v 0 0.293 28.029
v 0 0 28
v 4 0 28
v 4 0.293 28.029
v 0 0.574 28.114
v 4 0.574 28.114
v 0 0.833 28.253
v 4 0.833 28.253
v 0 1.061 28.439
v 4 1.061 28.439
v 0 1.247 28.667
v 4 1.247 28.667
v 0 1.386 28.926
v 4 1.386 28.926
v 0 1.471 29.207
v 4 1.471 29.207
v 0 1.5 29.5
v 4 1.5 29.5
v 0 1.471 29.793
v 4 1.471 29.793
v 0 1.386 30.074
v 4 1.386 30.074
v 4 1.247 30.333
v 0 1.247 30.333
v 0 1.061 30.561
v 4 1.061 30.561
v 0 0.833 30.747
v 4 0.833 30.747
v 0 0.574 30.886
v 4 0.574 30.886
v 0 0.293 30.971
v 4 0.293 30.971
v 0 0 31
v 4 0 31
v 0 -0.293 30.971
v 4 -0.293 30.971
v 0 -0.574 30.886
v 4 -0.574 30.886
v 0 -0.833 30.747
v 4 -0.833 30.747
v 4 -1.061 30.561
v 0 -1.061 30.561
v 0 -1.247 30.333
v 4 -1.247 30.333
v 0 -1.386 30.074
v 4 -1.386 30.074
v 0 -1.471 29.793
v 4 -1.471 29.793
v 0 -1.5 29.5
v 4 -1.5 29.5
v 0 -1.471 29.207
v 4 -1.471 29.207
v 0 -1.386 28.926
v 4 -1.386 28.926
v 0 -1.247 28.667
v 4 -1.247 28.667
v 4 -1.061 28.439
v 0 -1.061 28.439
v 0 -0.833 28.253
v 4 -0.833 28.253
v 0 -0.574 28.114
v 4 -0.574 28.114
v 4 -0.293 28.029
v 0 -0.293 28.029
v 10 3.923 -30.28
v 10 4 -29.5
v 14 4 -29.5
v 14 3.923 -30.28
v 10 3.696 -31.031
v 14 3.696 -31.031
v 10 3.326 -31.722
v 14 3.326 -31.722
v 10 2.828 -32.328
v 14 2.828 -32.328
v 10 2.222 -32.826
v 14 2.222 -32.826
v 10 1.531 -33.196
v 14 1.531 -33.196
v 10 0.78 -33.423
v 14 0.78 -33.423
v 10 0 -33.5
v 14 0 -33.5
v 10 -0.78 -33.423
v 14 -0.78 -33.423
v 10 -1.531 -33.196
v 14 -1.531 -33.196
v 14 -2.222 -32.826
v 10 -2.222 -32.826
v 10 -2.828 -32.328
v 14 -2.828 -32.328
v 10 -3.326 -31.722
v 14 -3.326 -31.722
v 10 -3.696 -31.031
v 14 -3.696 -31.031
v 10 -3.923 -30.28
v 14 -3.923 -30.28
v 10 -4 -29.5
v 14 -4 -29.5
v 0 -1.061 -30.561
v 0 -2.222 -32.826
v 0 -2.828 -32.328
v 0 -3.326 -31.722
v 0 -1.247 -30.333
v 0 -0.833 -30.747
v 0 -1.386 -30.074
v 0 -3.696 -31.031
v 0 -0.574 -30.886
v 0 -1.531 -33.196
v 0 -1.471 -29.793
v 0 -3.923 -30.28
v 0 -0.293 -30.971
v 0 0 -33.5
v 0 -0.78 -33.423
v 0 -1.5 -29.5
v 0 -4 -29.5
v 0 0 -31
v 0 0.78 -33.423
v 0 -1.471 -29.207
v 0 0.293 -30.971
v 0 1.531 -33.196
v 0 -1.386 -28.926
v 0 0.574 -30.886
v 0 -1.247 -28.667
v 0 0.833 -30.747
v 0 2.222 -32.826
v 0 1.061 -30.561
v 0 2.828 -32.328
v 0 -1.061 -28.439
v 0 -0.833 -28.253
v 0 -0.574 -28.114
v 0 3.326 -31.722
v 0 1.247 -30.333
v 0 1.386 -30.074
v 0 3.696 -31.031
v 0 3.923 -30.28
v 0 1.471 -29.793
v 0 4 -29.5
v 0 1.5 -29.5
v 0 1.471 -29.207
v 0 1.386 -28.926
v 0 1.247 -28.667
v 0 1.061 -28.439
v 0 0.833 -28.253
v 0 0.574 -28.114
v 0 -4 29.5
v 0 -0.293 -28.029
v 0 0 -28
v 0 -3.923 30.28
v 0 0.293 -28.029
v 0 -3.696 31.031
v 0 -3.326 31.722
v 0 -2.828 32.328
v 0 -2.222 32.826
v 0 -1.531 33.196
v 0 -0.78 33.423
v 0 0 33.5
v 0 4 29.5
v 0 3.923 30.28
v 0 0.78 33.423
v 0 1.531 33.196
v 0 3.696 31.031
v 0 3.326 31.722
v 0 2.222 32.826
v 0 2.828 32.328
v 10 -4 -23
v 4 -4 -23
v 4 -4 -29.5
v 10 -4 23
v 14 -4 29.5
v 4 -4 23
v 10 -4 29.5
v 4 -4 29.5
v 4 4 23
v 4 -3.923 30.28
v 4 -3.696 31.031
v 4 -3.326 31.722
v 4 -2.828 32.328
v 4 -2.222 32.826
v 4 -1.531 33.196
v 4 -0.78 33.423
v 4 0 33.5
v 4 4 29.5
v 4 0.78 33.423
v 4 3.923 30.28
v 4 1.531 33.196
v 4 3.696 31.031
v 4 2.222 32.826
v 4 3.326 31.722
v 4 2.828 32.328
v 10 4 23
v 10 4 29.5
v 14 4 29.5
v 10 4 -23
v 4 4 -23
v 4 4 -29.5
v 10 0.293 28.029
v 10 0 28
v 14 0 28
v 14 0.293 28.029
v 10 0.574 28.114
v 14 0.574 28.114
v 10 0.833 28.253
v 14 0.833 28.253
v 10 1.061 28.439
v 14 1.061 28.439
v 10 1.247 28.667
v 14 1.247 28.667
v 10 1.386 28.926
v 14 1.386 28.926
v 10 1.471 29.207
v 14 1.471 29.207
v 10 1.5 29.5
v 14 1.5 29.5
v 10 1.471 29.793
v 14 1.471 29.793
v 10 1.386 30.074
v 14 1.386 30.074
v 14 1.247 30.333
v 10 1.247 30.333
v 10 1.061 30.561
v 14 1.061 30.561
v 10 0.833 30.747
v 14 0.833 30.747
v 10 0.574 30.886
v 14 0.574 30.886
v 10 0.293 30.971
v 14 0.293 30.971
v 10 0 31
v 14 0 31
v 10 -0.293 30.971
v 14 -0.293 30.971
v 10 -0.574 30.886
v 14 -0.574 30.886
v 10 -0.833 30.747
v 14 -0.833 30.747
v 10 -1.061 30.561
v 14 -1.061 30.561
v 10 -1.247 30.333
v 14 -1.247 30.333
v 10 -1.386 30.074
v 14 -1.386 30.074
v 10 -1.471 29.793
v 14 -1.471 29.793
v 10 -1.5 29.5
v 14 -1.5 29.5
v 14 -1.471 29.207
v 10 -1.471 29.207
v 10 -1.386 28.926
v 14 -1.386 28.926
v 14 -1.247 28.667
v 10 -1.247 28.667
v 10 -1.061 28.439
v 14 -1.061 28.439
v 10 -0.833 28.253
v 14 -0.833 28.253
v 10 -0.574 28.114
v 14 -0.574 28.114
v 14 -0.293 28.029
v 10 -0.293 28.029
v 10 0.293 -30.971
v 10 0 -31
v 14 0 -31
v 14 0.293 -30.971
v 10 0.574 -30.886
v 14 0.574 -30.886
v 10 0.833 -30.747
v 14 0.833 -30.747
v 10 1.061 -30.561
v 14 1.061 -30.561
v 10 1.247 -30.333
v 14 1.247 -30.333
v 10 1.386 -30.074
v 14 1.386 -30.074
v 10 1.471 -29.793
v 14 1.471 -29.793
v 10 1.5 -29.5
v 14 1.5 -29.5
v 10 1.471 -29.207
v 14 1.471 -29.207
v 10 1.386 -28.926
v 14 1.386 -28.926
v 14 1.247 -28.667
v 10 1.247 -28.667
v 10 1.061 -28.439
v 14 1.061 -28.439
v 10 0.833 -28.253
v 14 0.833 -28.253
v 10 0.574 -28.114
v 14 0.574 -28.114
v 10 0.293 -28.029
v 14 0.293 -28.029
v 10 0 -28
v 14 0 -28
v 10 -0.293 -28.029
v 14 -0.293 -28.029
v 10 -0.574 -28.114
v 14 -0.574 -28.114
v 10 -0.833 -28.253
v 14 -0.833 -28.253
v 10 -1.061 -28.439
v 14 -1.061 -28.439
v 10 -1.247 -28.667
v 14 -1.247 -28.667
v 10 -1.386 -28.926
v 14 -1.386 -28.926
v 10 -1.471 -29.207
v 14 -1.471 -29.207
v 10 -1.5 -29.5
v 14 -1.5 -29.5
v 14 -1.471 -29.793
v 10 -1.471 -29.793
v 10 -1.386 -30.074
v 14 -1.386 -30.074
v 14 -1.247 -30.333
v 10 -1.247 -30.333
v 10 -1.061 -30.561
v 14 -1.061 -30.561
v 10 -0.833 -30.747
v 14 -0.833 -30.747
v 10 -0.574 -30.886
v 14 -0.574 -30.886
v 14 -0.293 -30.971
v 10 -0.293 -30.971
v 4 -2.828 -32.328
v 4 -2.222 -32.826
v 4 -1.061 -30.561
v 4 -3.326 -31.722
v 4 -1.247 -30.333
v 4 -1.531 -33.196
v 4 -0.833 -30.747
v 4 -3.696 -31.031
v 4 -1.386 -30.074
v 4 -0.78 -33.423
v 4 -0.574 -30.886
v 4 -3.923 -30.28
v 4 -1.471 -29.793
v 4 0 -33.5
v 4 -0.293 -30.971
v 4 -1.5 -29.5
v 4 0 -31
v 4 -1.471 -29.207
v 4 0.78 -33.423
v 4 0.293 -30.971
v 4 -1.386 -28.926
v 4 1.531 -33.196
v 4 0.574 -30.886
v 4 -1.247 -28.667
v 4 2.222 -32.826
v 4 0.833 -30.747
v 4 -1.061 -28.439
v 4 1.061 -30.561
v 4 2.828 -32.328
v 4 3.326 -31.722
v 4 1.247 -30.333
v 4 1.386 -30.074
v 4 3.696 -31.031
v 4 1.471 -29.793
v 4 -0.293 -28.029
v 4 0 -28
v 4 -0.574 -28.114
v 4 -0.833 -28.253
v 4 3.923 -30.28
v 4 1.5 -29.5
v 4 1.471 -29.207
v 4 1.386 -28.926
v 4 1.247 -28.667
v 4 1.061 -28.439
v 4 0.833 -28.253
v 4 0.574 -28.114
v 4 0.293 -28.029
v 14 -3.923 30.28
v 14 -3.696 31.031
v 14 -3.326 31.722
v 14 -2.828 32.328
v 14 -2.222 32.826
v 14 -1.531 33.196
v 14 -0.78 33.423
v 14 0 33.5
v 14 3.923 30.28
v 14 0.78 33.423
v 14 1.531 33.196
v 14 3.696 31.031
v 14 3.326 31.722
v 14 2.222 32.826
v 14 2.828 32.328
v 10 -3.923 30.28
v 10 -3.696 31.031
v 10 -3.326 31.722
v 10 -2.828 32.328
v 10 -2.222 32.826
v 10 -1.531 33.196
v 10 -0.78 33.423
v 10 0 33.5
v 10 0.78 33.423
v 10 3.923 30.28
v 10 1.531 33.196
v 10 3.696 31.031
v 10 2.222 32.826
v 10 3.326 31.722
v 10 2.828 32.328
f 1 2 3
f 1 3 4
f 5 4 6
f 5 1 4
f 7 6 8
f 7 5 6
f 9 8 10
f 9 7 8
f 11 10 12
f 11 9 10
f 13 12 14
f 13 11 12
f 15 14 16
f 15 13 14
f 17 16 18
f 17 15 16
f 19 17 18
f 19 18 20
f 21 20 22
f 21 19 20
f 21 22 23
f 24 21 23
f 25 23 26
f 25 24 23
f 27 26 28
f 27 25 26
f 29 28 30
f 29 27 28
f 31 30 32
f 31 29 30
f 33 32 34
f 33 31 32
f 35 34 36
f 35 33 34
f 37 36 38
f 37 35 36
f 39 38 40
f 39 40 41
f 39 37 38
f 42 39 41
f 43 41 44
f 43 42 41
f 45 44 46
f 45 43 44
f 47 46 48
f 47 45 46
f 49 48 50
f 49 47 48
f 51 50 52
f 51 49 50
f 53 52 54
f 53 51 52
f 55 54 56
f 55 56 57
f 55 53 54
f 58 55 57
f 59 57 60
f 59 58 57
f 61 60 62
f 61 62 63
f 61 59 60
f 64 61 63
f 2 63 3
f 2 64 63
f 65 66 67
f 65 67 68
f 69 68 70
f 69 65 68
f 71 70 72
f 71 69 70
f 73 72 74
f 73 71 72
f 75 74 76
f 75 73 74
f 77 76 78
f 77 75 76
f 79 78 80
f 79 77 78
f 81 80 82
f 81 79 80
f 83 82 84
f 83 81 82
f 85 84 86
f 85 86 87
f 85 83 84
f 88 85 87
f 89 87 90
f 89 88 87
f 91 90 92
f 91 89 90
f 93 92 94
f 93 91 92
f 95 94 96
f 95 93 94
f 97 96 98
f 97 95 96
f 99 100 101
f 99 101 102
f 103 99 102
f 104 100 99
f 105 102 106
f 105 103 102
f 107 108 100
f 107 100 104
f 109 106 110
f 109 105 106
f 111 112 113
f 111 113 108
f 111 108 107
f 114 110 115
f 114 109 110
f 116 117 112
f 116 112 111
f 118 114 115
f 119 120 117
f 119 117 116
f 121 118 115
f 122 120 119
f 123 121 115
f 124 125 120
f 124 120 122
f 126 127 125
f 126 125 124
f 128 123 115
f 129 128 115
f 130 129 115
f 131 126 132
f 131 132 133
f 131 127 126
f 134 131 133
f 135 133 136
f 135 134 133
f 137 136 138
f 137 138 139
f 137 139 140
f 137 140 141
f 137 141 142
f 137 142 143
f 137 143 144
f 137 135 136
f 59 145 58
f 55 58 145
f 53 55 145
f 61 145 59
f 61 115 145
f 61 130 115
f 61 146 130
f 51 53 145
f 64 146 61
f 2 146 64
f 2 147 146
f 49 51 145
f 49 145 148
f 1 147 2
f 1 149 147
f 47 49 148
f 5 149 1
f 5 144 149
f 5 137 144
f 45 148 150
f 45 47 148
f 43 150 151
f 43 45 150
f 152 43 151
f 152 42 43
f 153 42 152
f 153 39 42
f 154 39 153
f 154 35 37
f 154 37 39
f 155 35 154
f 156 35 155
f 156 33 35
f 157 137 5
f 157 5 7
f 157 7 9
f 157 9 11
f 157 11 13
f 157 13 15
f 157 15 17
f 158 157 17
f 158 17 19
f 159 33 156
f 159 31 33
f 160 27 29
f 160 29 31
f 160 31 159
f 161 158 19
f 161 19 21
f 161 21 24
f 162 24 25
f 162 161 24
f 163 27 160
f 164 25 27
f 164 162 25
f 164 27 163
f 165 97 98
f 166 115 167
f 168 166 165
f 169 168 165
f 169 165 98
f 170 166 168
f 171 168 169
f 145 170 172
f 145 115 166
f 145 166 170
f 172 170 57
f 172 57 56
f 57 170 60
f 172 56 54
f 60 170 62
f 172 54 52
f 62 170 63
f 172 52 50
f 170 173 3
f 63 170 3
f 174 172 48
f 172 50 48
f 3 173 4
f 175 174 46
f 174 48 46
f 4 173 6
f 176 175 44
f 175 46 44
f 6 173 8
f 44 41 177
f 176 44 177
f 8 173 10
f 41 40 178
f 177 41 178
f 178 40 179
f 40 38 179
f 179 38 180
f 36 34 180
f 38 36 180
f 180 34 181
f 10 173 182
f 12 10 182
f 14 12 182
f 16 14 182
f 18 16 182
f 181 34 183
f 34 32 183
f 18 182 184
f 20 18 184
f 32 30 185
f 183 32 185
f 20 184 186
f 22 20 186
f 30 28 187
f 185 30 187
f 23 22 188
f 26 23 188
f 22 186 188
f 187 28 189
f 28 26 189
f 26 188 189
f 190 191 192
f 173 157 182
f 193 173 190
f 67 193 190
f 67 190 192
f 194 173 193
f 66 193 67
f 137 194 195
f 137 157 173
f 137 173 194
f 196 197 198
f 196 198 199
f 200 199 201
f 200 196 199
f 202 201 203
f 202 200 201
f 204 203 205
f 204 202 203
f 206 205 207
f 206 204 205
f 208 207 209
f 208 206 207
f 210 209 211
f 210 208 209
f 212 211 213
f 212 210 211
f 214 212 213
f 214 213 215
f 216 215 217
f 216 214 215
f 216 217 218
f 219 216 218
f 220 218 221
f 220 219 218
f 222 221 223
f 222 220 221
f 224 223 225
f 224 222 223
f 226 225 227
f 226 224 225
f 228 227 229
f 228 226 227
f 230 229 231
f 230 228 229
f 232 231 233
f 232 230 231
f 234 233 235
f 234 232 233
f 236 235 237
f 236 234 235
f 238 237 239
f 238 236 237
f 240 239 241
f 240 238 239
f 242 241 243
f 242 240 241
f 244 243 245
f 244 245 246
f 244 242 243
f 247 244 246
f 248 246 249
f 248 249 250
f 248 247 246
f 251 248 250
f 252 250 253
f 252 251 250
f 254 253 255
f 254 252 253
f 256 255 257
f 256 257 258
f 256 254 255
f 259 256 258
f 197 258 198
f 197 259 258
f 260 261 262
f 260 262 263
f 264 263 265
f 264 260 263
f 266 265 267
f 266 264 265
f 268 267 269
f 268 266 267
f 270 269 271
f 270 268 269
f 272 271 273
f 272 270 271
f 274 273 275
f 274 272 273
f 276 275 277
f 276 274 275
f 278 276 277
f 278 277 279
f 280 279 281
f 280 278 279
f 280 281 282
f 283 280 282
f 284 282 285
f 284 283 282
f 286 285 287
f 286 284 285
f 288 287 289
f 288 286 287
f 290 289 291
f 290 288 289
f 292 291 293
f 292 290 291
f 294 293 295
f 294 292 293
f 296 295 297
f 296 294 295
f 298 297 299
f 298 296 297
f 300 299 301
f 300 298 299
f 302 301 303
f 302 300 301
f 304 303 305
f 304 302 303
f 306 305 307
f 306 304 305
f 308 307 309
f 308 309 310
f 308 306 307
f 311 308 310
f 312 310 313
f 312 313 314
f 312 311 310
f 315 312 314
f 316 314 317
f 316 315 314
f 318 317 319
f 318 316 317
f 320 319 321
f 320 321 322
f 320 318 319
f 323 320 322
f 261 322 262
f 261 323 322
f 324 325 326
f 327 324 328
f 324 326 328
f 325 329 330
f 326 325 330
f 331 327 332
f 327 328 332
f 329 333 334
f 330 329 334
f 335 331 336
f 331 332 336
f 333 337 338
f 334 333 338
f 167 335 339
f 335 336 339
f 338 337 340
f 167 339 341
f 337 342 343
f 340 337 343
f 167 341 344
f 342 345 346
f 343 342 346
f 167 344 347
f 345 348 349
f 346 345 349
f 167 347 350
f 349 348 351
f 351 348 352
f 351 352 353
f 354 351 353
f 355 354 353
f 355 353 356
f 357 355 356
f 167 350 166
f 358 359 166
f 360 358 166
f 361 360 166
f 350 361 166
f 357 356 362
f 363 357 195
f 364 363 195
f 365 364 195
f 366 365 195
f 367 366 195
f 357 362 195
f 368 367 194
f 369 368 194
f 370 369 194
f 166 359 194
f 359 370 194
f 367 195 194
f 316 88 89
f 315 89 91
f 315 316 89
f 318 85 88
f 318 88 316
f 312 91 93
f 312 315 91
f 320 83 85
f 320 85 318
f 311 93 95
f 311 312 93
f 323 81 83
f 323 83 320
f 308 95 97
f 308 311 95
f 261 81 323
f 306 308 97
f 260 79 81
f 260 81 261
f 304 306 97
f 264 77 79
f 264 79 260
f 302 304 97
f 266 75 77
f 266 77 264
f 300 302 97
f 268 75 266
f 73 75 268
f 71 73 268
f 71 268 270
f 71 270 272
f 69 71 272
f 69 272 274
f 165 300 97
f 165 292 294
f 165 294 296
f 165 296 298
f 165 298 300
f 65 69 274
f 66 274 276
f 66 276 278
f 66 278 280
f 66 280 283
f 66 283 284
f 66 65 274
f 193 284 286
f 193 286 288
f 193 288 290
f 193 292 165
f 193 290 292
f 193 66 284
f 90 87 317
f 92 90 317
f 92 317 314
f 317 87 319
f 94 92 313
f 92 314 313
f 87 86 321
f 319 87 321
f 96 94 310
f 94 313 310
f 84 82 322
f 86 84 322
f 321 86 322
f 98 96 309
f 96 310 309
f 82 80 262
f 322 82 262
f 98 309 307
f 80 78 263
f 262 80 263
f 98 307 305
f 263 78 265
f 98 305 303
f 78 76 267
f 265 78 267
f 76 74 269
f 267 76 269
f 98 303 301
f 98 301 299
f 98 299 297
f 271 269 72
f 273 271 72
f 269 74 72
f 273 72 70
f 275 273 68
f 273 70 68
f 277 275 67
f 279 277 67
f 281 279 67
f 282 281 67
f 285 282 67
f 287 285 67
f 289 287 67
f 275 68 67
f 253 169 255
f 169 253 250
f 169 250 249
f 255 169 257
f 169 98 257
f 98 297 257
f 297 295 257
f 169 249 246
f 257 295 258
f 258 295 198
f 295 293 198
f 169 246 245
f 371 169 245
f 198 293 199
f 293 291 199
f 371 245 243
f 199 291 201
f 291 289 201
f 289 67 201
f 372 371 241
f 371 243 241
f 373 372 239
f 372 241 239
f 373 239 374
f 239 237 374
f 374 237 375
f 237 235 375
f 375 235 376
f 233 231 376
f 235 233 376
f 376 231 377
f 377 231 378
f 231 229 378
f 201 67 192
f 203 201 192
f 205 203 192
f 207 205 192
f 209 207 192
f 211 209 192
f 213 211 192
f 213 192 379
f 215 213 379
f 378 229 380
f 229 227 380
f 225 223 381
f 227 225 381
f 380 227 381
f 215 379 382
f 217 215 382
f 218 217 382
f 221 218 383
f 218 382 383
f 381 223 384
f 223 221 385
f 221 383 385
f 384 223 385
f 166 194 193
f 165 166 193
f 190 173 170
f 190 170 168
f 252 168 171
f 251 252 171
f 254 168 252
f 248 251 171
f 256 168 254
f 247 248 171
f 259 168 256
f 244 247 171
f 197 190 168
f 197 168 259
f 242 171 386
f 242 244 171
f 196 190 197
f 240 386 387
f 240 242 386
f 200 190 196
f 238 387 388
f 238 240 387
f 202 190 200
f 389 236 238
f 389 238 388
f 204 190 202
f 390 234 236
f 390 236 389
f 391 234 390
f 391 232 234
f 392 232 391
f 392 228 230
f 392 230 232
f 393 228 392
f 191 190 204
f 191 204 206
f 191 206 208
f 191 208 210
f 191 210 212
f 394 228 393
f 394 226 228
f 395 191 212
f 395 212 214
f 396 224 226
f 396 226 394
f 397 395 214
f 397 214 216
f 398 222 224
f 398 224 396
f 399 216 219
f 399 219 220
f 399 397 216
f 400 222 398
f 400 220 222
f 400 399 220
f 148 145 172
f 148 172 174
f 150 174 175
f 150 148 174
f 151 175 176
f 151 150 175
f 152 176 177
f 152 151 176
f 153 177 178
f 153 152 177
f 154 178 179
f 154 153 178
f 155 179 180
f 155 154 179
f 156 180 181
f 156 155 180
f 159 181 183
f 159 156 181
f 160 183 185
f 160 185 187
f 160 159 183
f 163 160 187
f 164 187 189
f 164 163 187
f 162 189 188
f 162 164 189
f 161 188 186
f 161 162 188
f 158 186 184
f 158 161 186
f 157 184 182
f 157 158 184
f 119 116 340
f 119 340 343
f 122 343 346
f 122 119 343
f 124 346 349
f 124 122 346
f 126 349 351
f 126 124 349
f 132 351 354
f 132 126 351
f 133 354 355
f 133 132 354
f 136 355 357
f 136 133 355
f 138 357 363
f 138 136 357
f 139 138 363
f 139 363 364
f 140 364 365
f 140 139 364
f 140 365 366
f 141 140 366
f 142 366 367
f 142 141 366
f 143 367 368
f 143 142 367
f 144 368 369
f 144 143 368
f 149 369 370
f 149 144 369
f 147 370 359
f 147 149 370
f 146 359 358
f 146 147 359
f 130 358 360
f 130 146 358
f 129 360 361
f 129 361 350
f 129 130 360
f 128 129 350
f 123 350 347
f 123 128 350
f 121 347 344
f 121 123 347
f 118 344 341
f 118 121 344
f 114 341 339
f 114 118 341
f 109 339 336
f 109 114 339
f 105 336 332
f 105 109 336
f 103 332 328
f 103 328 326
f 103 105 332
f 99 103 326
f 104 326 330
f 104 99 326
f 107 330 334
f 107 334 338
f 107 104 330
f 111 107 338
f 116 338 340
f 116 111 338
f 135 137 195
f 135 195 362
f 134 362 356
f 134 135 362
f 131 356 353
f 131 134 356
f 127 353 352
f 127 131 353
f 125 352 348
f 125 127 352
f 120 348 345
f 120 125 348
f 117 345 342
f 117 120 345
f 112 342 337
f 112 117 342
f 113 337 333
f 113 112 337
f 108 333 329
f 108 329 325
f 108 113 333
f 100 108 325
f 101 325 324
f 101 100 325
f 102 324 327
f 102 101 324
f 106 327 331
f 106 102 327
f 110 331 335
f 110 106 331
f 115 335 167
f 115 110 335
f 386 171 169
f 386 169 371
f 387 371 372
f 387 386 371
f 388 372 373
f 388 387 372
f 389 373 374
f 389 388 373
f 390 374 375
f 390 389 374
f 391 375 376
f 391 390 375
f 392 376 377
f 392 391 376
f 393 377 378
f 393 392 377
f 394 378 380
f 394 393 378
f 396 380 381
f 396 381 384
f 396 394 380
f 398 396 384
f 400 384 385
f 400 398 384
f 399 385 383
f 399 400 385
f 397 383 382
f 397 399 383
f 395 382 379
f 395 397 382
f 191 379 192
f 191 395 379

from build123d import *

# Parameters (mm, degrees)
CROQUIS1_R              = 1.5
SALIENTE_EXTRUIR1_DEPTH = 4
CROQUIS2_W              = 6
CROQUIS2_H              = 8
SALIENTE_EXTRUIR2_DEPTH = 23
CROQUIS3_R              = 1.5
SALIENTE_EXTRUIR3_DEPTH = 4


with BuildPart() as part:
    # Croquis1 → Saliente-Extruir1 (new body)
    with BuildSketch(Plane(origin=(0, 0, 0), x_dir=(0, 0, -1), z_dir=(1, 0, 0))):
        with BuildLine():
            Line((-29.5, 4), (29.5, 4))
            ThreePointArc((29.5, 4), (33.5, 0), (29.5, -4))
            Line((29.5, -4), (-29.5, -4))
            ThreePointArc((-29.5, -4), (-33.5, 0), (-29.5, 4))
        make_face()
        with Locations((-29.5, 0)):
            Circle(CROQUIS1_R, mode=Mode.SUBTRACT)
        with Locations((29.5, 0)):
            Circle(CROQUIS1_R, mode=Mode.SUBTRACT)
    extrude(amount=SALIENTE_EXTRUIR1_DEPTH)

    # Croquis2 → Saliente-Extruir2 (add, symmetric)
    with BuildSketch(Plane.XY):
        with Locations((7, 0)):
            Rectangle(CROQUIS2_W, CROQUIS2_H)
    extrude(amount=SALIENTE_EXTRUIR2_DEPTH, both=True)

    # Croquis3 → Saliente-Extruir3 (add)
    with BuildSketch(Plane(origin=(10, 0, 0), x_dir=(0, 0, -1), z_dir=(1, 0, 0))):
        with BuildLine():
            Line((-29.5, 4), (29.5, 4))
            ThreePointArc((29.5, 4), (33.5, 0), (29.5, -4))
            Line((29.5, -4), (-29.5, -4))
            ThreePointArc((-29.5, -4), (-33.5, 0), (-29.5, 4))
        make_face()
        with Locations((-29.5, 0)):
            Circle(CROQUIS3_R, mode=Mode.SUBTRACT)
        with Locations((29.5, 0)):
            Circle(CROQUIS3_R, mode=Mode.SUBTRACT)
    extrude(amount=SALIENTE_EXTRUIR3_DEPTH)


solid = part.part
